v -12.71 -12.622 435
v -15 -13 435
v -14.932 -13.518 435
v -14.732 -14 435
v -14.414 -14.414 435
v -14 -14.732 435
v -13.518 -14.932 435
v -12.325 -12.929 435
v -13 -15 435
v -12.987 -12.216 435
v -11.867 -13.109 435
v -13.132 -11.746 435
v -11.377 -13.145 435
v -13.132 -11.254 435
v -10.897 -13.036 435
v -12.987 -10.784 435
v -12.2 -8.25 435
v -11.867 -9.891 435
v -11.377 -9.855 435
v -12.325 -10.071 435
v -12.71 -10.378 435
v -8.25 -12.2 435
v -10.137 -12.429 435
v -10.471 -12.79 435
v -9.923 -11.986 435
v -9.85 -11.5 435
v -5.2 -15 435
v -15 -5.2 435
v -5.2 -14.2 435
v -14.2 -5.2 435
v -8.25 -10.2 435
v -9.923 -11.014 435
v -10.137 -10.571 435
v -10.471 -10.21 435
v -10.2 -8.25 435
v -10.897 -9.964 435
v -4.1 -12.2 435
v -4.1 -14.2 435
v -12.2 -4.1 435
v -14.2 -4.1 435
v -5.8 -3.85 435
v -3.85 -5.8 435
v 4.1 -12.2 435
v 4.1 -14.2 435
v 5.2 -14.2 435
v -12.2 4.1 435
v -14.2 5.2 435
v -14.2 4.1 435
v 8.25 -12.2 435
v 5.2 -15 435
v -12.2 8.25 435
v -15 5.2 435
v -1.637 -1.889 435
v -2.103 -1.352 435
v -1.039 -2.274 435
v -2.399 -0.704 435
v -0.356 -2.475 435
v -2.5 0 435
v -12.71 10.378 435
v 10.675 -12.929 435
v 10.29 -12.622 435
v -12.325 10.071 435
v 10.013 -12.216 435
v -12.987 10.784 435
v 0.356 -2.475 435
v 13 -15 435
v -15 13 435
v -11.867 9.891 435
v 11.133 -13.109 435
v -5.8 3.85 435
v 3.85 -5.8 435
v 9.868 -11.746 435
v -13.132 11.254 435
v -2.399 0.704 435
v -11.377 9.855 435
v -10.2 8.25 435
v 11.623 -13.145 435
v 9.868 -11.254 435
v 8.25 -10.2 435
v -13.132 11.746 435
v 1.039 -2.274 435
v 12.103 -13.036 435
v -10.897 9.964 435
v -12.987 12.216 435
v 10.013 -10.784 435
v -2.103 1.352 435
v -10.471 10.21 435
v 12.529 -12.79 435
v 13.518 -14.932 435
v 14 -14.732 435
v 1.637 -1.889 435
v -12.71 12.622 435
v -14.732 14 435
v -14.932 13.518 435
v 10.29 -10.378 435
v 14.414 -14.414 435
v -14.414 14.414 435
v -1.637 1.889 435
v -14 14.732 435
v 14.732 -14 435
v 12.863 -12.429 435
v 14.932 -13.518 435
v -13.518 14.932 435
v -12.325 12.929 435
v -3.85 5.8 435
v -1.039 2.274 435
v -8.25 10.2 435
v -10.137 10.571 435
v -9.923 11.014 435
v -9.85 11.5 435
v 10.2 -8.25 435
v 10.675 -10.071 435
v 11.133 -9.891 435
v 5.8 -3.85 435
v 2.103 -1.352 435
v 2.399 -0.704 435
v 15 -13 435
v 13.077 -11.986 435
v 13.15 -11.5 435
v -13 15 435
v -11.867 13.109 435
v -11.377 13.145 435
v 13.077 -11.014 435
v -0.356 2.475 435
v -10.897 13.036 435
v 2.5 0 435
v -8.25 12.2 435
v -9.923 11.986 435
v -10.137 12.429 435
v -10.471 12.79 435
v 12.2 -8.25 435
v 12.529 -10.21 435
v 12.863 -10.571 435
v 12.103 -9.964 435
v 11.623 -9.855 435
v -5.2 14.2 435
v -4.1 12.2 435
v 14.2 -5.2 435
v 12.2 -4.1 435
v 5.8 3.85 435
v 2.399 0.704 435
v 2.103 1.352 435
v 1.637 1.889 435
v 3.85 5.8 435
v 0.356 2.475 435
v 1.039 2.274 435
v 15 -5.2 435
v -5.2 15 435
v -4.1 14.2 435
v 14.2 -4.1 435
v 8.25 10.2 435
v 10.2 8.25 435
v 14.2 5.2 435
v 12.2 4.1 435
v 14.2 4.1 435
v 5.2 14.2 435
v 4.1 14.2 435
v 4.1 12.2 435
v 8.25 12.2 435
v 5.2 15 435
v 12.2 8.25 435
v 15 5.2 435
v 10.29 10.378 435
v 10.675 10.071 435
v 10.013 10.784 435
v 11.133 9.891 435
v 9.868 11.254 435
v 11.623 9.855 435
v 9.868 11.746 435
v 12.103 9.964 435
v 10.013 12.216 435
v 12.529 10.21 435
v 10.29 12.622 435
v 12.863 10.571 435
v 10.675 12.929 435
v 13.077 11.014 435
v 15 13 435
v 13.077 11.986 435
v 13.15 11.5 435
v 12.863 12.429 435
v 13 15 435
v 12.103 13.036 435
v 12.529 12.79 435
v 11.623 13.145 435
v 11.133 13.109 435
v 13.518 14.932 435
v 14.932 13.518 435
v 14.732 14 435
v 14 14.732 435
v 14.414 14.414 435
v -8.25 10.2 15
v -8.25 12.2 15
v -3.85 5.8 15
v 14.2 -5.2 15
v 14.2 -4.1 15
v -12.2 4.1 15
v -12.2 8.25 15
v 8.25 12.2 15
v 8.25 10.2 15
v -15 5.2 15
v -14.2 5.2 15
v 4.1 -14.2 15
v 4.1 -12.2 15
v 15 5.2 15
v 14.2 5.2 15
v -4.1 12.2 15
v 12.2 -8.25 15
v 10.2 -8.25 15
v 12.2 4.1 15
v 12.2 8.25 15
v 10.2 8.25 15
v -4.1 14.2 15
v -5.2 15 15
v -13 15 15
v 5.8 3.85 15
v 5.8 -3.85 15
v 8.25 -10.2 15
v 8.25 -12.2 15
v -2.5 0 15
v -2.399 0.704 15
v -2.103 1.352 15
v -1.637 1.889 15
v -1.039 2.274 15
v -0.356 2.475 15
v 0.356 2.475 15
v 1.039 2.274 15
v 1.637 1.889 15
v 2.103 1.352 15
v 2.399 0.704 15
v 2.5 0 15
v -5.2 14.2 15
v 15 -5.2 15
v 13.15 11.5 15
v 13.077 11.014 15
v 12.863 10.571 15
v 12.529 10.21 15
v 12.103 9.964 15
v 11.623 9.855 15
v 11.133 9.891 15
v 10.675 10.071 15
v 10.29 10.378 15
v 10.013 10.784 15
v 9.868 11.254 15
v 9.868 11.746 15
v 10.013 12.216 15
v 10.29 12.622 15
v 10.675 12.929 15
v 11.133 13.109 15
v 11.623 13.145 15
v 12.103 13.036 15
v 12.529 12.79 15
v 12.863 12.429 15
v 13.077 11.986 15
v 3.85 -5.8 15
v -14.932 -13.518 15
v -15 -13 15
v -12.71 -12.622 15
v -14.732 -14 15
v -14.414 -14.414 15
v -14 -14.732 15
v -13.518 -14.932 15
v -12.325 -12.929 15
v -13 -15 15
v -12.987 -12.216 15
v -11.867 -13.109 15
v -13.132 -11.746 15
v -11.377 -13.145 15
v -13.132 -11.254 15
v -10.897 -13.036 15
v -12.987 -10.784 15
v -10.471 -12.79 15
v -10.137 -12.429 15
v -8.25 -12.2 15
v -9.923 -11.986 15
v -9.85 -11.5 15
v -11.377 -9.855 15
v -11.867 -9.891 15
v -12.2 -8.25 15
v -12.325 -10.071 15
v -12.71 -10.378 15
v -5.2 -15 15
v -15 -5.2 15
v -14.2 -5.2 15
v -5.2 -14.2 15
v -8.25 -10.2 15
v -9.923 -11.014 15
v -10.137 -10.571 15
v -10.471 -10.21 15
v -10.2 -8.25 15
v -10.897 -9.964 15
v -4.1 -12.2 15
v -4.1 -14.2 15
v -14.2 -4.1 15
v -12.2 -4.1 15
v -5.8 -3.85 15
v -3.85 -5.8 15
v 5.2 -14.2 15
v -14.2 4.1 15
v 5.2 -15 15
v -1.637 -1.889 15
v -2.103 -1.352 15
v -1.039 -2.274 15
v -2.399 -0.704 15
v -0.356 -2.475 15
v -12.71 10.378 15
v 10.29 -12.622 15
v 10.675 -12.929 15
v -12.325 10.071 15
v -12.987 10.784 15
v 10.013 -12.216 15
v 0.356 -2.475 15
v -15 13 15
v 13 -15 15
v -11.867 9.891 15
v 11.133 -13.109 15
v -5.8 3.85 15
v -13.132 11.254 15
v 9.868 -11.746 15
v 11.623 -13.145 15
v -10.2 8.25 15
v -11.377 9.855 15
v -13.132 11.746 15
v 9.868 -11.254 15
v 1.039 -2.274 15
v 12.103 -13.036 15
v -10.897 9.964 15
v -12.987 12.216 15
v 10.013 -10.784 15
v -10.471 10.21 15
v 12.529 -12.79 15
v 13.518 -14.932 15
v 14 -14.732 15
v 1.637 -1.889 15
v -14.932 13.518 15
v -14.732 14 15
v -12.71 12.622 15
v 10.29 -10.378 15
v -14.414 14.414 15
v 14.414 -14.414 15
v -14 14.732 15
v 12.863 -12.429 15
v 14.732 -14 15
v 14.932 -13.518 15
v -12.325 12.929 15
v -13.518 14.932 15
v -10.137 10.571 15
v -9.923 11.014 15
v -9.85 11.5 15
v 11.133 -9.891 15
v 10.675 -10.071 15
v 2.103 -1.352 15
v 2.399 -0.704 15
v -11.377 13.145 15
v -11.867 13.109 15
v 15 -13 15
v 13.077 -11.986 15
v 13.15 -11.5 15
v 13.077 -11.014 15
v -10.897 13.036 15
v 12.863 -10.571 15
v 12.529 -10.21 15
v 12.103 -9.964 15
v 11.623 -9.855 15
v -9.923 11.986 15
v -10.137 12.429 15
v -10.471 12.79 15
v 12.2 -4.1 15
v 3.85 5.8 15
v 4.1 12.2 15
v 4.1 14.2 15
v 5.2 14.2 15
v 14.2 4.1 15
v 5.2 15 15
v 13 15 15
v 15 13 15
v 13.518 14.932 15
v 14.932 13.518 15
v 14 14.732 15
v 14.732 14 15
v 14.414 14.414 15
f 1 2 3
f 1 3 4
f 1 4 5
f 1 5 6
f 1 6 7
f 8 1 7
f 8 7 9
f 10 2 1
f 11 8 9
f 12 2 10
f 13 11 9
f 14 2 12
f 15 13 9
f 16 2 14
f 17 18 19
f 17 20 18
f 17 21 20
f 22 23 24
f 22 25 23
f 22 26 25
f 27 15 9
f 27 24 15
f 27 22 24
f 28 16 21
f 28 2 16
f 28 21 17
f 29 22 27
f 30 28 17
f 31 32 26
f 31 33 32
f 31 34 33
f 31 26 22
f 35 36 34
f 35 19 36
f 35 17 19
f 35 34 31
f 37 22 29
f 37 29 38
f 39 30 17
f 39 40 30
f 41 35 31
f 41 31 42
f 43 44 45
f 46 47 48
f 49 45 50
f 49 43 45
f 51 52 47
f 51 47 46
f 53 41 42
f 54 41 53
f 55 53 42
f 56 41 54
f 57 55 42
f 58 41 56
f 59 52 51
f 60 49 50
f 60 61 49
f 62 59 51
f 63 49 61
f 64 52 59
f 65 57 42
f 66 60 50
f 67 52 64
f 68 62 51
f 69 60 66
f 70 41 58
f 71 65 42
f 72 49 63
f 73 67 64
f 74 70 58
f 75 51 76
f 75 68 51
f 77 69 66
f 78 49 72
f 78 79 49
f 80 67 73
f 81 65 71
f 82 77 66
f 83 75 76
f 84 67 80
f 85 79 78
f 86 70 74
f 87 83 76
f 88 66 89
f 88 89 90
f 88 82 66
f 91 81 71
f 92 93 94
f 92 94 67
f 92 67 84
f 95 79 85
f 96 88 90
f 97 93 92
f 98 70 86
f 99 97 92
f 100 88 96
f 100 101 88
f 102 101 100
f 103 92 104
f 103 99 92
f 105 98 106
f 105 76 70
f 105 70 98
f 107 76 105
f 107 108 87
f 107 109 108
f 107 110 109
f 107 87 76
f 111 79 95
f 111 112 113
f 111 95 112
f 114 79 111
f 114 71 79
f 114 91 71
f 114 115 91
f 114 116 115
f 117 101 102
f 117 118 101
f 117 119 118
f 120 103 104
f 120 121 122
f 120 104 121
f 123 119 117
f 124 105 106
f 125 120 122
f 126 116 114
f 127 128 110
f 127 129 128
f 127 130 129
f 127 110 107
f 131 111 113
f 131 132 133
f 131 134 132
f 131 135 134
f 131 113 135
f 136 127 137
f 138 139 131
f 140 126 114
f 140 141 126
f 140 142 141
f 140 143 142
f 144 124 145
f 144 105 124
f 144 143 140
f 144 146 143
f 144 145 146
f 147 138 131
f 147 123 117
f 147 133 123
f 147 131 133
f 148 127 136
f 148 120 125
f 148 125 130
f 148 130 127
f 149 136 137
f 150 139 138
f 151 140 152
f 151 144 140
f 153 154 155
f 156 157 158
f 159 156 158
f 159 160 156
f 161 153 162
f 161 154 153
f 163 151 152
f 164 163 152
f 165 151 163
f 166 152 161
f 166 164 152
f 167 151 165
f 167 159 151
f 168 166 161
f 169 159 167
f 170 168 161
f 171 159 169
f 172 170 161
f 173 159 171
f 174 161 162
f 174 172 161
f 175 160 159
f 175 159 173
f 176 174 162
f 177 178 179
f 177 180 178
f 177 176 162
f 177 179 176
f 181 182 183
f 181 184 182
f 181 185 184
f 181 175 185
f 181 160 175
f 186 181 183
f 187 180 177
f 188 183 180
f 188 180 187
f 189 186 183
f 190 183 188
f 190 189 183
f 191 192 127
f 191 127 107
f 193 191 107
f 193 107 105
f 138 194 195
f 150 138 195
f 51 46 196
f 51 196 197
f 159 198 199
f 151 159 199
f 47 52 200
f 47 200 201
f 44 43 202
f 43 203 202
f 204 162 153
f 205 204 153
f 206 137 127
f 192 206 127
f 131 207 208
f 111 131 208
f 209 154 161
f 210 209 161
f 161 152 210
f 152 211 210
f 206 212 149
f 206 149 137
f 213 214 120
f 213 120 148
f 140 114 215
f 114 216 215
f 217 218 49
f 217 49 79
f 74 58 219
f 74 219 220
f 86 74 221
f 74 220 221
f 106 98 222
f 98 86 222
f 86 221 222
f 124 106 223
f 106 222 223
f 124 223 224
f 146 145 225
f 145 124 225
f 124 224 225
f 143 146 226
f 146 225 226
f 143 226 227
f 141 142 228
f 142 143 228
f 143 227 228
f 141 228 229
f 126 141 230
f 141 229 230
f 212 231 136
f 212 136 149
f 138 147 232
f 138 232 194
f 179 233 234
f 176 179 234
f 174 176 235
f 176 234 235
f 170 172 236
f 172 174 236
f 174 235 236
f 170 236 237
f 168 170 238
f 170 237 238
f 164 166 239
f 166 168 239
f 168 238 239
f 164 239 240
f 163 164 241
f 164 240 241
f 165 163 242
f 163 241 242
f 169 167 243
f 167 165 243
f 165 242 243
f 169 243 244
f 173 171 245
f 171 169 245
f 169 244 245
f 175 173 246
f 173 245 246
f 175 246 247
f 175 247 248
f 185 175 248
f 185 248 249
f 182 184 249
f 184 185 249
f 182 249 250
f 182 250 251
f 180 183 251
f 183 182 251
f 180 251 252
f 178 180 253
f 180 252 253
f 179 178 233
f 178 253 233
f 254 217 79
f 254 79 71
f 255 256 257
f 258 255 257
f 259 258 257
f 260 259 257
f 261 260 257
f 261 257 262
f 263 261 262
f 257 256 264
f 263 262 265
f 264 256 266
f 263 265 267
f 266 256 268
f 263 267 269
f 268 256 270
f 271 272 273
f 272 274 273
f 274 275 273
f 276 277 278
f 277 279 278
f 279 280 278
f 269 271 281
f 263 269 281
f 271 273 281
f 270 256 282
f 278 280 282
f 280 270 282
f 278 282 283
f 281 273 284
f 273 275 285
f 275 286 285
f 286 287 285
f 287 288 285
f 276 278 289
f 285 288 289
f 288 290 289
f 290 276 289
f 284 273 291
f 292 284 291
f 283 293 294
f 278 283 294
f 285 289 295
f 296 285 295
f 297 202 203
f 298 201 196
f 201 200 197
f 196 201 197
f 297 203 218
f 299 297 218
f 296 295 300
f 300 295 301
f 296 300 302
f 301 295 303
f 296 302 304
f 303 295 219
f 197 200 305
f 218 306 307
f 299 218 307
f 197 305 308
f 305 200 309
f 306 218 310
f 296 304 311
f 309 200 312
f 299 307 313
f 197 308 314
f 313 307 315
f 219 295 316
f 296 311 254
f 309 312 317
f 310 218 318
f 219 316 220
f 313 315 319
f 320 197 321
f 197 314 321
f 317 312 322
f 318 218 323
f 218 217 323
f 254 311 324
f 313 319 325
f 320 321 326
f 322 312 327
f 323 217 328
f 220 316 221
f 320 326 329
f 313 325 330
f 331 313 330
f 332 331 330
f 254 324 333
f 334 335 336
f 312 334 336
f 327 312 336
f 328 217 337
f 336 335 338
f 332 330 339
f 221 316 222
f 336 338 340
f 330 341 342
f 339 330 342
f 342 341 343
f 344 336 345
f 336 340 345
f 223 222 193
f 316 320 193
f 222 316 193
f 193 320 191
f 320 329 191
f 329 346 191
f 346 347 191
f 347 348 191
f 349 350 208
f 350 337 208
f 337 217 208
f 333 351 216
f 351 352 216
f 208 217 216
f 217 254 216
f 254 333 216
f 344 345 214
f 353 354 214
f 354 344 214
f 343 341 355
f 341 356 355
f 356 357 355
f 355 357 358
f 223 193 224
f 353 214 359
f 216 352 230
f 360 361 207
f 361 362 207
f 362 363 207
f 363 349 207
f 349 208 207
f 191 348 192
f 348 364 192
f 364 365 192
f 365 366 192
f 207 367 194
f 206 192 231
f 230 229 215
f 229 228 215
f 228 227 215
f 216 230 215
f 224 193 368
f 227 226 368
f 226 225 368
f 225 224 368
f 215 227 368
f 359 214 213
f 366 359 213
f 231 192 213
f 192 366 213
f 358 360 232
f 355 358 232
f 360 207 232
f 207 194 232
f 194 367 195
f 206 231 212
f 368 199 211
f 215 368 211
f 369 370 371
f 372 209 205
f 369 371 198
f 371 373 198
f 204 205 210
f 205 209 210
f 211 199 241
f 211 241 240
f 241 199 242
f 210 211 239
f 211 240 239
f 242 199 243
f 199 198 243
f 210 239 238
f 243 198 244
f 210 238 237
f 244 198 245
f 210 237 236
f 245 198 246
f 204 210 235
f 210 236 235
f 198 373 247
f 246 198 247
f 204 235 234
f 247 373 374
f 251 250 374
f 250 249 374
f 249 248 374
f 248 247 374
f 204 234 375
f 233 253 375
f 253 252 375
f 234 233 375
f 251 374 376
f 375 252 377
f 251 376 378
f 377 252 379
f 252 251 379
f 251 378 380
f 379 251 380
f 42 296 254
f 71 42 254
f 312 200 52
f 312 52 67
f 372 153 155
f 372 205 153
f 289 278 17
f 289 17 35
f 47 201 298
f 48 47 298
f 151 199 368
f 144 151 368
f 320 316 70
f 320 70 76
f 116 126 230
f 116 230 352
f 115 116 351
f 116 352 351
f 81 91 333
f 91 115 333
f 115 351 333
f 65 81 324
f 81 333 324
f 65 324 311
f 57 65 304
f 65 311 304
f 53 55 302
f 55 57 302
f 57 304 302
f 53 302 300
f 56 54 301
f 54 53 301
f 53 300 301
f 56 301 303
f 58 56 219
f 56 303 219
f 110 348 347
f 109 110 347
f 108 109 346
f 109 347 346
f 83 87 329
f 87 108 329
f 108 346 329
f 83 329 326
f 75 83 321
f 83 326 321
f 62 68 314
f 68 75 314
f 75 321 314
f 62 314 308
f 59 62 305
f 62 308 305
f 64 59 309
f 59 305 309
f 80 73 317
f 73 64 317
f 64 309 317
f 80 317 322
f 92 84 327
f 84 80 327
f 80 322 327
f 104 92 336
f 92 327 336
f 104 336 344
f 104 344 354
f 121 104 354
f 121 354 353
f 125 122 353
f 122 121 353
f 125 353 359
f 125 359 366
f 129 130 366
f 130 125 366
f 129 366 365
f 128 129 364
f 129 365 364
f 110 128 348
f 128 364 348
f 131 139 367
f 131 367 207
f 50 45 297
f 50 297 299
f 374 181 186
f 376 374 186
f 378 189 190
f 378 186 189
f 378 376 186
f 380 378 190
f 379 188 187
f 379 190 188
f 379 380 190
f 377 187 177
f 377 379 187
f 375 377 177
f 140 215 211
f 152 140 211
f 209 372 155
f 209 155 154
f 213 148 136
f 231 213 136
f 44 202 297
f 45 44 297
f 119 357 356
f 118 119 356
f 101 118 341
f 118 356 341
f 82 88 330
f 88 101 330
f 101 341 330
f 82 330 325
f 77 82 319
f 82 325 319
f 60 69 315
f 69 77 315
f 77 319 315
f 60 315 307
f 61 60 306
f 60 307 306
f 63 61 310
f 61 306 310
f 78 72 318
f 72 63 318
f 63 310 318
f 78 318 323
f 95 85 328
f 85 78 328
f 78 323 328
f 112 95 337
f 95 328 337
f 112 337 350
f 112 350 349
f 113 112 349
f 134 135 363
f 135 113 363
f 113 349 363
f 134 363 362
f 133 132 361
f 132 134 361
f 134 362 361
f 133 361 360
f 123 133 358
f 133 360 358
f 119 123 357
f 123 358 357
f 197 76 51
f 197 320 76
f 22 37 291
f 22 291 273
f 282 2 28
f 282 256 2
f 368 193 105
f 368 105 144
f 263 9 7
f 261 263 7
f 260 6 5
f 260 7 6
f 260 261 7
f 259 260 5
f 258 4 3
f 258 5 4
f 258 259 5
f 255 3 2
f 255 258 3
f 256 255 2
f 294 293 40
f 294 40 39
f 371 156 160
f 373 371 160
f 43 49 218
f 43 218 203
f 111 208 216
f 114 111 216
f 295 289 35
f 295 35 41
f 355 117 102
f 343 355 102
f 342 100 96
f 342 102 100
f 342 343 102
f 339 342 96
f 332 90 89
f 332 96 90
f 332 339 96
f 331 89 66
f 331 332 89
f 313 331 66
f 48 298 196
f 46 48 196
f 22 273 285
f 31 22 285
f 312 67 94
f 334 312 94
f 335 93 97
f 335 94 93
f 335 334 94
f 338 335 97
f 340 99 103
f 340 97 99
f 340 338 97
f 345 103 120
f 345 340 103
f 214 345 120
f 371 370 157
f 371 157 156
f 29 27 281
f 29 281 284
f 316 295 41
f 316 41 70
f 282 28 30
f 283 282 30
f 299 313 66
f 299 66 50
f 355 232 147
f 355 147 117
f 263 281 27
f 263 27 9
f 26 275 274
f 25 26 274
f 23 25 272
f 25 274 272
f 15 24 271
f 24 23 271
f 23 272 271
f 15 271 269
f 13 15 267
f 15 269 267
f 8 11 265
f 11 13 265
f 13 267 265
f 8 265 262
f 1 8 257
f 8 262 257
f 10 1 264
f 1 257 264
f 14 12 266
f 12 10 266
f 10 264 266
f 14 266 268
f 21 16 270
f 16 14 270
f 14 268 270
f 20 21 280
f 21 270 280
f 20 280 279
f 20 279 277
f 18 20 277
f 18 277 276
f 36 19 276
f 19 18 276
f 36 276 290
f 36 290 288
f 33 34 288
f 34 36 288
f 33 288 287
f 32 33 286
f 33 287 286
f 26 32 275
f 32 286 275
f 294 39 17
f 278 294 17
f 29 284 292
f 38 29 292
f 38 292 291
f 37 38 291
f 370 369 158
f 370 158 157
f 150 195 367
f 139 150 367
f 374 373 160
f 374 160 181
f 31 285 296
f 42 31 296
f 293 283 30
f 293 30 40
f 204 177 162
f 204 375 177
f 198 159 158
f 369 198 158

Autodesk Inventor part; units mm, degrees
sketch "Sketch" plane through (0, 0, 0) normal (0, 0, 1) x (1, 0, 0)
  line L0 (-13, 15) -> (13, 15)
  line L1 (15, 13) -> (15, -13)
  line L2 (-15, 15) -> (15, -15) construction
  line L3 (15, 15) -> (-15, -15) construction
  line L4 (-5.2, 15) -> (-5.2, 14.2)
  line L5 (-5.2, 14.2) -> (-4.1, 14.2)
  line L6 (-4.1, 14.2) -> (-4.1, 12.2)
  line L7 (-4.1, 12.2) -> (-8.25, 12.2)
  line L8 (-8.25, 12.2) -> (-8.25, 10.2)
  line L9 (-8.25, 10.2) -> (-3.85, 5.8)
  line L10 (-3.85, 5.8) -> (3.85, 5.8)
  line L11 (8.25, 12.2) -> (4.1, 12.2)
  line L12 (4.1, 12.2) -> (4.1, 14.2)
  line L13 (4.1, 14.2) -> (5.2, 14.2)
  line L14 (5.2, 14.2) -> (5.2, 15)
  line L15 (8.25, 12.2) -> (8.25, 10.2)
  line L16 (8.25, 10.2) -> (3.85, 5.8)
  line L17 (-2.5, 0) -> (0, 0)
  line L18 (-5.2, -15) -> (-5.2, -14.2)
  line L19 (-5.2, -14.2) -> (-4.1, -14.2)
  line L20 (-4.1, -14.2) -> (-4.1, -12.2)
  line L21 (-4.1, -12.2) -> (-8.25, -12.2)
  line L22 (-8.25, -12.2) -> (-8.25, -10.2)
  line L23 (-8.25, -10.2) -> (-3.85, -5.8)
  line L24 (-3.85, -5.8) -> (3.85, -5.8)
  line L25 (8.25, -12.2) -> (4.1, -12.2)
  line L26 (4.1, -12.2) -> (4.1, -14.2)
  line L27 (4.1, -14.2) -> (5.2, -14.2)
  line L28 (5.2, -14.2) -> (5.2, -15)
  line L29 (8.25, -12.2) -> (8.25, -10.2)
  line L30 (8.25, -10.2) -> (3.85, -5.8)
  line L31 (15, 5.2) -> (14.2, 5.2)
  line L32 (14.2, 5.2) -> (14.2, 4.1)
  line L33 (14.2, 4.1) -> (12.2, 4.1)
  line L34 (12.2, 4.1) -> (12.2, 8.25)
  line L35 (15, -5.2) -> (14.2, -5.2)
  line L36 (14.2, -5.2) -> (14.2, -4.1)
  line L37 (14.2, -4.1) -> (12.2, -4.1)
  line L38 (12.2, -4.1) -> (12.2, -8.25)
  line L39 (12.2, -8.25) -> (10.2, -8.25)
  line L40 (10.2, -8.25) -> (5.8, -3.85)
  line L41 (5.8, -3.85) -> (5.8, 3.85)
  line L42 (5.8, 3.85) -> (10.2, 8.25)
  line L43 (10.2, 8.25) -> (12.2, 8.25)
  line L44 (-15, 5.2) -> (-14.2, 5.2)
  line L45 (-14.2, 5.2) -> (-14.2, 4.1)
  line L46 (-14.2, 4.1) -> (-12.2, 4.1)
  line L47 (-12.2, 4.1) -> (-12.2, 8.25)
  line L48 (-15, -5.2) -> (-14.2, -5.2)
  line L49 (-14.2, -5.2) -> (-14.2, -4.1)
  line L50 (-14.2, -4.1) -> (-12.2, -4.1)
  line L51 (-12.2, -4.1) -> (-12.2, -8.25)
  line L52 (-12.2, -8.25) -> (-10.2, -8.25)
  line L53 (-10.2, -8.25) -> (-5.8, -3.85)
  line L54 (-5.8, -3.85) -> (-5.8, 3.85)
  line L55 (-5.8, 3.85) -> (-10.2, 8.25)
  line L56 (-10.2, 8.25) -> (-12.2, 8.25)
  circle A0 centre (11.5, 11.5) radius 1.65
  circle A1 centre (11.5, -11.5) radius 1.65
  circle A2 centre (-11.5, 11.5) radius 1.65
  circle A3 centre (-11.5, -11.5) radius 1.65
  line L57 (-15, -13) -> (-15, -5.2)
  line L58 (-15, 5.2) -> (-15, 13)
  line L59 (13, -15) -> (5.2, -15)
  line L60 (-5.2, -15) -> (-13, -15)
  arc A4 (-13, 15) -> (-15, 13) centre (-13, 13) ccw
  arc A5 (15, 13) -> (13, 15) centre (13, 13) ccw
  arc A6 (13, -15) -> (15, -13) centre (13, -13) ccw
  arc A7 (-15, -13) -> (-13, -15) centre (-13, -13) ccw
  circle A8 centre (0, 0) radius 2.5
  point P0 (0, 0)
  point P1 (0, 5.8)
  point P2 (0, -2.5)
  point P3 (0, 2.5)
  dimension "d2" = 8.2
  dimension "d3" = 4.1
  dimension "d4" = 10.4
  dimension "d5" = 5.2
  dimension "d8" = 9.2
  dimension "d11" = 16.5
  dimension "d12" = 8.25
  dimension "d14" = 0.8
  dimension "d15" = 2
  dimension "d16" = 2
  dimension "d34" = 0.8
  dimension "d35" = 10.4
  dimension "d36" = 5.2
  dimension "d37" = 8.2
  dimension "d38" = 4.1
  dimension "d39" = 2
  dimension "d40" = 16.5
  dimension "d41" = 8.25
  dimension "d42" = 2
  dimension "d43" = 9.2
  dimension "d44" = 23
  dimension "d45" = 11.5
  dimension "d46" = 23
  dimension "d48" = 3.3
  dimension "d55" = 2
  dimension "d62" = 5
  dimension "d65" = 11.5
  dimension "d66" = 6.4
  dimension "d67" = 3.25
  dimension "d68" = 4.15
  dimension "d69" = 0.8
  dimension "d70" = 2
  dimension "d71" = 2.7577
  dimension "d72" = 5.8
  dimension "d73" = 2.7577
  dimension "d74" = 4.15
  dimension "d75" = 2
  dimension "d76" = 3.25
  dimension "d77" = 2
  dimension "d78" = 1.1
  dimension "d79" = 0.8
  dimension "d80" = 135
  dimension "d81" = 2
  dimension "d82" = 1.1
  dimension "d83" = 7.4
  dimension "d84" = 7.4
  dimension "d85" = 6.4
  dimension "d86" = 6.3
ref_plane "Work Plane3" through (0, 0, 250) normal (0, 0, 1) x (1, 0, 0)
ref_plane "Start Plane" through (0, 0, 0) normal (0, 0, 1) x (1, 0, 0)
ref_plane "End Plane" through (0, 0, 450) normal (0, 0, 1) x (1, 0, 0)
ref_plane "Start Plane1" through (0, 0, 0) normal (0, 0, 1) x (1, 0, 0)
ref_plane "End Plane1" through (0, 0, 450) normal (0, 0, 1) x (1, 0, 0)
ref_plane "Start Plane2" through (0, 0, 15) normal (0, 0, 1) x (1, 0, 0)
ref_plane "End Plane2" through (0, 0, 435) normal (0, 0, 1) x (1, 0, 0)
extrude "Body" add sketch "Sketch" along normal up to surface (420 mm away) from surface at 15 contours L0 L4 L5 L6 L7 L8 L9 L10 L16 L15 L11 L12 L13 L14 A5 L1 L31 L32 L33 L34 L43 L42 L41 L40 L39 L38 L37 L36 L35 A6 L59 L28 L27 L26 L25 L29 L30 L24 L23 L22 L21 L20 L19 L18 L60 A7 L57 L48 L49 L50 L51 L52 L53 L54 L55 L56 L47 L46 L45 L44 L58 A4
sketch "Sketch7" plane through (0, 0, 0) normal (0, 0, 1) x (1, 0, 0)
  line L0 (0, 0) -> (10, 0)
ref_plane "Work Plane10" through (0, 0, 0) normal (0, -1, 0) x (1, 0, 0)
sketch "Sketch8" plane through (0, 0, 0) normal (0, -1, 0) x (1, 0, 0)
  line L0 (-2, 15) -> (12, 15)
  line L1 (-2, 435) -> (12, 435)
  dimension "d100" = 420
equation "\"d3\" = 0.5 * d2"
equation "\"d5\" = 0.5 * d4"
equation "\"d12\" = 0.5 * d11"
equation "\"d36\" = 0.5 * d35"
equation "\"d38\" = 0.5 * d37"
equation "\"d41\" = 0.5 * d40"
equation "\"d45\" = 0.5 * d44"
equation "\"G_OFFSET_START\" = 0"
equation "\"G_OFFSET_END\" = 0"
equation "\"G_L\" = 500"
equation "\"G_OFFSET_START1\" = 0"
equation "\"G_OFFSET_END1\" = 0"
equation "\"G_OFFSET_START2\" = -15"
equation "\"G_OFFSET_END2\" = -15"
equation "\"d95\" = -G_OFFSET_START2"
equation "\"d96\" = Length + G_OFFSET_END2"
equation "\"Length\" = 450"
properties part number "420 mm" material "Aluminum 6061"
